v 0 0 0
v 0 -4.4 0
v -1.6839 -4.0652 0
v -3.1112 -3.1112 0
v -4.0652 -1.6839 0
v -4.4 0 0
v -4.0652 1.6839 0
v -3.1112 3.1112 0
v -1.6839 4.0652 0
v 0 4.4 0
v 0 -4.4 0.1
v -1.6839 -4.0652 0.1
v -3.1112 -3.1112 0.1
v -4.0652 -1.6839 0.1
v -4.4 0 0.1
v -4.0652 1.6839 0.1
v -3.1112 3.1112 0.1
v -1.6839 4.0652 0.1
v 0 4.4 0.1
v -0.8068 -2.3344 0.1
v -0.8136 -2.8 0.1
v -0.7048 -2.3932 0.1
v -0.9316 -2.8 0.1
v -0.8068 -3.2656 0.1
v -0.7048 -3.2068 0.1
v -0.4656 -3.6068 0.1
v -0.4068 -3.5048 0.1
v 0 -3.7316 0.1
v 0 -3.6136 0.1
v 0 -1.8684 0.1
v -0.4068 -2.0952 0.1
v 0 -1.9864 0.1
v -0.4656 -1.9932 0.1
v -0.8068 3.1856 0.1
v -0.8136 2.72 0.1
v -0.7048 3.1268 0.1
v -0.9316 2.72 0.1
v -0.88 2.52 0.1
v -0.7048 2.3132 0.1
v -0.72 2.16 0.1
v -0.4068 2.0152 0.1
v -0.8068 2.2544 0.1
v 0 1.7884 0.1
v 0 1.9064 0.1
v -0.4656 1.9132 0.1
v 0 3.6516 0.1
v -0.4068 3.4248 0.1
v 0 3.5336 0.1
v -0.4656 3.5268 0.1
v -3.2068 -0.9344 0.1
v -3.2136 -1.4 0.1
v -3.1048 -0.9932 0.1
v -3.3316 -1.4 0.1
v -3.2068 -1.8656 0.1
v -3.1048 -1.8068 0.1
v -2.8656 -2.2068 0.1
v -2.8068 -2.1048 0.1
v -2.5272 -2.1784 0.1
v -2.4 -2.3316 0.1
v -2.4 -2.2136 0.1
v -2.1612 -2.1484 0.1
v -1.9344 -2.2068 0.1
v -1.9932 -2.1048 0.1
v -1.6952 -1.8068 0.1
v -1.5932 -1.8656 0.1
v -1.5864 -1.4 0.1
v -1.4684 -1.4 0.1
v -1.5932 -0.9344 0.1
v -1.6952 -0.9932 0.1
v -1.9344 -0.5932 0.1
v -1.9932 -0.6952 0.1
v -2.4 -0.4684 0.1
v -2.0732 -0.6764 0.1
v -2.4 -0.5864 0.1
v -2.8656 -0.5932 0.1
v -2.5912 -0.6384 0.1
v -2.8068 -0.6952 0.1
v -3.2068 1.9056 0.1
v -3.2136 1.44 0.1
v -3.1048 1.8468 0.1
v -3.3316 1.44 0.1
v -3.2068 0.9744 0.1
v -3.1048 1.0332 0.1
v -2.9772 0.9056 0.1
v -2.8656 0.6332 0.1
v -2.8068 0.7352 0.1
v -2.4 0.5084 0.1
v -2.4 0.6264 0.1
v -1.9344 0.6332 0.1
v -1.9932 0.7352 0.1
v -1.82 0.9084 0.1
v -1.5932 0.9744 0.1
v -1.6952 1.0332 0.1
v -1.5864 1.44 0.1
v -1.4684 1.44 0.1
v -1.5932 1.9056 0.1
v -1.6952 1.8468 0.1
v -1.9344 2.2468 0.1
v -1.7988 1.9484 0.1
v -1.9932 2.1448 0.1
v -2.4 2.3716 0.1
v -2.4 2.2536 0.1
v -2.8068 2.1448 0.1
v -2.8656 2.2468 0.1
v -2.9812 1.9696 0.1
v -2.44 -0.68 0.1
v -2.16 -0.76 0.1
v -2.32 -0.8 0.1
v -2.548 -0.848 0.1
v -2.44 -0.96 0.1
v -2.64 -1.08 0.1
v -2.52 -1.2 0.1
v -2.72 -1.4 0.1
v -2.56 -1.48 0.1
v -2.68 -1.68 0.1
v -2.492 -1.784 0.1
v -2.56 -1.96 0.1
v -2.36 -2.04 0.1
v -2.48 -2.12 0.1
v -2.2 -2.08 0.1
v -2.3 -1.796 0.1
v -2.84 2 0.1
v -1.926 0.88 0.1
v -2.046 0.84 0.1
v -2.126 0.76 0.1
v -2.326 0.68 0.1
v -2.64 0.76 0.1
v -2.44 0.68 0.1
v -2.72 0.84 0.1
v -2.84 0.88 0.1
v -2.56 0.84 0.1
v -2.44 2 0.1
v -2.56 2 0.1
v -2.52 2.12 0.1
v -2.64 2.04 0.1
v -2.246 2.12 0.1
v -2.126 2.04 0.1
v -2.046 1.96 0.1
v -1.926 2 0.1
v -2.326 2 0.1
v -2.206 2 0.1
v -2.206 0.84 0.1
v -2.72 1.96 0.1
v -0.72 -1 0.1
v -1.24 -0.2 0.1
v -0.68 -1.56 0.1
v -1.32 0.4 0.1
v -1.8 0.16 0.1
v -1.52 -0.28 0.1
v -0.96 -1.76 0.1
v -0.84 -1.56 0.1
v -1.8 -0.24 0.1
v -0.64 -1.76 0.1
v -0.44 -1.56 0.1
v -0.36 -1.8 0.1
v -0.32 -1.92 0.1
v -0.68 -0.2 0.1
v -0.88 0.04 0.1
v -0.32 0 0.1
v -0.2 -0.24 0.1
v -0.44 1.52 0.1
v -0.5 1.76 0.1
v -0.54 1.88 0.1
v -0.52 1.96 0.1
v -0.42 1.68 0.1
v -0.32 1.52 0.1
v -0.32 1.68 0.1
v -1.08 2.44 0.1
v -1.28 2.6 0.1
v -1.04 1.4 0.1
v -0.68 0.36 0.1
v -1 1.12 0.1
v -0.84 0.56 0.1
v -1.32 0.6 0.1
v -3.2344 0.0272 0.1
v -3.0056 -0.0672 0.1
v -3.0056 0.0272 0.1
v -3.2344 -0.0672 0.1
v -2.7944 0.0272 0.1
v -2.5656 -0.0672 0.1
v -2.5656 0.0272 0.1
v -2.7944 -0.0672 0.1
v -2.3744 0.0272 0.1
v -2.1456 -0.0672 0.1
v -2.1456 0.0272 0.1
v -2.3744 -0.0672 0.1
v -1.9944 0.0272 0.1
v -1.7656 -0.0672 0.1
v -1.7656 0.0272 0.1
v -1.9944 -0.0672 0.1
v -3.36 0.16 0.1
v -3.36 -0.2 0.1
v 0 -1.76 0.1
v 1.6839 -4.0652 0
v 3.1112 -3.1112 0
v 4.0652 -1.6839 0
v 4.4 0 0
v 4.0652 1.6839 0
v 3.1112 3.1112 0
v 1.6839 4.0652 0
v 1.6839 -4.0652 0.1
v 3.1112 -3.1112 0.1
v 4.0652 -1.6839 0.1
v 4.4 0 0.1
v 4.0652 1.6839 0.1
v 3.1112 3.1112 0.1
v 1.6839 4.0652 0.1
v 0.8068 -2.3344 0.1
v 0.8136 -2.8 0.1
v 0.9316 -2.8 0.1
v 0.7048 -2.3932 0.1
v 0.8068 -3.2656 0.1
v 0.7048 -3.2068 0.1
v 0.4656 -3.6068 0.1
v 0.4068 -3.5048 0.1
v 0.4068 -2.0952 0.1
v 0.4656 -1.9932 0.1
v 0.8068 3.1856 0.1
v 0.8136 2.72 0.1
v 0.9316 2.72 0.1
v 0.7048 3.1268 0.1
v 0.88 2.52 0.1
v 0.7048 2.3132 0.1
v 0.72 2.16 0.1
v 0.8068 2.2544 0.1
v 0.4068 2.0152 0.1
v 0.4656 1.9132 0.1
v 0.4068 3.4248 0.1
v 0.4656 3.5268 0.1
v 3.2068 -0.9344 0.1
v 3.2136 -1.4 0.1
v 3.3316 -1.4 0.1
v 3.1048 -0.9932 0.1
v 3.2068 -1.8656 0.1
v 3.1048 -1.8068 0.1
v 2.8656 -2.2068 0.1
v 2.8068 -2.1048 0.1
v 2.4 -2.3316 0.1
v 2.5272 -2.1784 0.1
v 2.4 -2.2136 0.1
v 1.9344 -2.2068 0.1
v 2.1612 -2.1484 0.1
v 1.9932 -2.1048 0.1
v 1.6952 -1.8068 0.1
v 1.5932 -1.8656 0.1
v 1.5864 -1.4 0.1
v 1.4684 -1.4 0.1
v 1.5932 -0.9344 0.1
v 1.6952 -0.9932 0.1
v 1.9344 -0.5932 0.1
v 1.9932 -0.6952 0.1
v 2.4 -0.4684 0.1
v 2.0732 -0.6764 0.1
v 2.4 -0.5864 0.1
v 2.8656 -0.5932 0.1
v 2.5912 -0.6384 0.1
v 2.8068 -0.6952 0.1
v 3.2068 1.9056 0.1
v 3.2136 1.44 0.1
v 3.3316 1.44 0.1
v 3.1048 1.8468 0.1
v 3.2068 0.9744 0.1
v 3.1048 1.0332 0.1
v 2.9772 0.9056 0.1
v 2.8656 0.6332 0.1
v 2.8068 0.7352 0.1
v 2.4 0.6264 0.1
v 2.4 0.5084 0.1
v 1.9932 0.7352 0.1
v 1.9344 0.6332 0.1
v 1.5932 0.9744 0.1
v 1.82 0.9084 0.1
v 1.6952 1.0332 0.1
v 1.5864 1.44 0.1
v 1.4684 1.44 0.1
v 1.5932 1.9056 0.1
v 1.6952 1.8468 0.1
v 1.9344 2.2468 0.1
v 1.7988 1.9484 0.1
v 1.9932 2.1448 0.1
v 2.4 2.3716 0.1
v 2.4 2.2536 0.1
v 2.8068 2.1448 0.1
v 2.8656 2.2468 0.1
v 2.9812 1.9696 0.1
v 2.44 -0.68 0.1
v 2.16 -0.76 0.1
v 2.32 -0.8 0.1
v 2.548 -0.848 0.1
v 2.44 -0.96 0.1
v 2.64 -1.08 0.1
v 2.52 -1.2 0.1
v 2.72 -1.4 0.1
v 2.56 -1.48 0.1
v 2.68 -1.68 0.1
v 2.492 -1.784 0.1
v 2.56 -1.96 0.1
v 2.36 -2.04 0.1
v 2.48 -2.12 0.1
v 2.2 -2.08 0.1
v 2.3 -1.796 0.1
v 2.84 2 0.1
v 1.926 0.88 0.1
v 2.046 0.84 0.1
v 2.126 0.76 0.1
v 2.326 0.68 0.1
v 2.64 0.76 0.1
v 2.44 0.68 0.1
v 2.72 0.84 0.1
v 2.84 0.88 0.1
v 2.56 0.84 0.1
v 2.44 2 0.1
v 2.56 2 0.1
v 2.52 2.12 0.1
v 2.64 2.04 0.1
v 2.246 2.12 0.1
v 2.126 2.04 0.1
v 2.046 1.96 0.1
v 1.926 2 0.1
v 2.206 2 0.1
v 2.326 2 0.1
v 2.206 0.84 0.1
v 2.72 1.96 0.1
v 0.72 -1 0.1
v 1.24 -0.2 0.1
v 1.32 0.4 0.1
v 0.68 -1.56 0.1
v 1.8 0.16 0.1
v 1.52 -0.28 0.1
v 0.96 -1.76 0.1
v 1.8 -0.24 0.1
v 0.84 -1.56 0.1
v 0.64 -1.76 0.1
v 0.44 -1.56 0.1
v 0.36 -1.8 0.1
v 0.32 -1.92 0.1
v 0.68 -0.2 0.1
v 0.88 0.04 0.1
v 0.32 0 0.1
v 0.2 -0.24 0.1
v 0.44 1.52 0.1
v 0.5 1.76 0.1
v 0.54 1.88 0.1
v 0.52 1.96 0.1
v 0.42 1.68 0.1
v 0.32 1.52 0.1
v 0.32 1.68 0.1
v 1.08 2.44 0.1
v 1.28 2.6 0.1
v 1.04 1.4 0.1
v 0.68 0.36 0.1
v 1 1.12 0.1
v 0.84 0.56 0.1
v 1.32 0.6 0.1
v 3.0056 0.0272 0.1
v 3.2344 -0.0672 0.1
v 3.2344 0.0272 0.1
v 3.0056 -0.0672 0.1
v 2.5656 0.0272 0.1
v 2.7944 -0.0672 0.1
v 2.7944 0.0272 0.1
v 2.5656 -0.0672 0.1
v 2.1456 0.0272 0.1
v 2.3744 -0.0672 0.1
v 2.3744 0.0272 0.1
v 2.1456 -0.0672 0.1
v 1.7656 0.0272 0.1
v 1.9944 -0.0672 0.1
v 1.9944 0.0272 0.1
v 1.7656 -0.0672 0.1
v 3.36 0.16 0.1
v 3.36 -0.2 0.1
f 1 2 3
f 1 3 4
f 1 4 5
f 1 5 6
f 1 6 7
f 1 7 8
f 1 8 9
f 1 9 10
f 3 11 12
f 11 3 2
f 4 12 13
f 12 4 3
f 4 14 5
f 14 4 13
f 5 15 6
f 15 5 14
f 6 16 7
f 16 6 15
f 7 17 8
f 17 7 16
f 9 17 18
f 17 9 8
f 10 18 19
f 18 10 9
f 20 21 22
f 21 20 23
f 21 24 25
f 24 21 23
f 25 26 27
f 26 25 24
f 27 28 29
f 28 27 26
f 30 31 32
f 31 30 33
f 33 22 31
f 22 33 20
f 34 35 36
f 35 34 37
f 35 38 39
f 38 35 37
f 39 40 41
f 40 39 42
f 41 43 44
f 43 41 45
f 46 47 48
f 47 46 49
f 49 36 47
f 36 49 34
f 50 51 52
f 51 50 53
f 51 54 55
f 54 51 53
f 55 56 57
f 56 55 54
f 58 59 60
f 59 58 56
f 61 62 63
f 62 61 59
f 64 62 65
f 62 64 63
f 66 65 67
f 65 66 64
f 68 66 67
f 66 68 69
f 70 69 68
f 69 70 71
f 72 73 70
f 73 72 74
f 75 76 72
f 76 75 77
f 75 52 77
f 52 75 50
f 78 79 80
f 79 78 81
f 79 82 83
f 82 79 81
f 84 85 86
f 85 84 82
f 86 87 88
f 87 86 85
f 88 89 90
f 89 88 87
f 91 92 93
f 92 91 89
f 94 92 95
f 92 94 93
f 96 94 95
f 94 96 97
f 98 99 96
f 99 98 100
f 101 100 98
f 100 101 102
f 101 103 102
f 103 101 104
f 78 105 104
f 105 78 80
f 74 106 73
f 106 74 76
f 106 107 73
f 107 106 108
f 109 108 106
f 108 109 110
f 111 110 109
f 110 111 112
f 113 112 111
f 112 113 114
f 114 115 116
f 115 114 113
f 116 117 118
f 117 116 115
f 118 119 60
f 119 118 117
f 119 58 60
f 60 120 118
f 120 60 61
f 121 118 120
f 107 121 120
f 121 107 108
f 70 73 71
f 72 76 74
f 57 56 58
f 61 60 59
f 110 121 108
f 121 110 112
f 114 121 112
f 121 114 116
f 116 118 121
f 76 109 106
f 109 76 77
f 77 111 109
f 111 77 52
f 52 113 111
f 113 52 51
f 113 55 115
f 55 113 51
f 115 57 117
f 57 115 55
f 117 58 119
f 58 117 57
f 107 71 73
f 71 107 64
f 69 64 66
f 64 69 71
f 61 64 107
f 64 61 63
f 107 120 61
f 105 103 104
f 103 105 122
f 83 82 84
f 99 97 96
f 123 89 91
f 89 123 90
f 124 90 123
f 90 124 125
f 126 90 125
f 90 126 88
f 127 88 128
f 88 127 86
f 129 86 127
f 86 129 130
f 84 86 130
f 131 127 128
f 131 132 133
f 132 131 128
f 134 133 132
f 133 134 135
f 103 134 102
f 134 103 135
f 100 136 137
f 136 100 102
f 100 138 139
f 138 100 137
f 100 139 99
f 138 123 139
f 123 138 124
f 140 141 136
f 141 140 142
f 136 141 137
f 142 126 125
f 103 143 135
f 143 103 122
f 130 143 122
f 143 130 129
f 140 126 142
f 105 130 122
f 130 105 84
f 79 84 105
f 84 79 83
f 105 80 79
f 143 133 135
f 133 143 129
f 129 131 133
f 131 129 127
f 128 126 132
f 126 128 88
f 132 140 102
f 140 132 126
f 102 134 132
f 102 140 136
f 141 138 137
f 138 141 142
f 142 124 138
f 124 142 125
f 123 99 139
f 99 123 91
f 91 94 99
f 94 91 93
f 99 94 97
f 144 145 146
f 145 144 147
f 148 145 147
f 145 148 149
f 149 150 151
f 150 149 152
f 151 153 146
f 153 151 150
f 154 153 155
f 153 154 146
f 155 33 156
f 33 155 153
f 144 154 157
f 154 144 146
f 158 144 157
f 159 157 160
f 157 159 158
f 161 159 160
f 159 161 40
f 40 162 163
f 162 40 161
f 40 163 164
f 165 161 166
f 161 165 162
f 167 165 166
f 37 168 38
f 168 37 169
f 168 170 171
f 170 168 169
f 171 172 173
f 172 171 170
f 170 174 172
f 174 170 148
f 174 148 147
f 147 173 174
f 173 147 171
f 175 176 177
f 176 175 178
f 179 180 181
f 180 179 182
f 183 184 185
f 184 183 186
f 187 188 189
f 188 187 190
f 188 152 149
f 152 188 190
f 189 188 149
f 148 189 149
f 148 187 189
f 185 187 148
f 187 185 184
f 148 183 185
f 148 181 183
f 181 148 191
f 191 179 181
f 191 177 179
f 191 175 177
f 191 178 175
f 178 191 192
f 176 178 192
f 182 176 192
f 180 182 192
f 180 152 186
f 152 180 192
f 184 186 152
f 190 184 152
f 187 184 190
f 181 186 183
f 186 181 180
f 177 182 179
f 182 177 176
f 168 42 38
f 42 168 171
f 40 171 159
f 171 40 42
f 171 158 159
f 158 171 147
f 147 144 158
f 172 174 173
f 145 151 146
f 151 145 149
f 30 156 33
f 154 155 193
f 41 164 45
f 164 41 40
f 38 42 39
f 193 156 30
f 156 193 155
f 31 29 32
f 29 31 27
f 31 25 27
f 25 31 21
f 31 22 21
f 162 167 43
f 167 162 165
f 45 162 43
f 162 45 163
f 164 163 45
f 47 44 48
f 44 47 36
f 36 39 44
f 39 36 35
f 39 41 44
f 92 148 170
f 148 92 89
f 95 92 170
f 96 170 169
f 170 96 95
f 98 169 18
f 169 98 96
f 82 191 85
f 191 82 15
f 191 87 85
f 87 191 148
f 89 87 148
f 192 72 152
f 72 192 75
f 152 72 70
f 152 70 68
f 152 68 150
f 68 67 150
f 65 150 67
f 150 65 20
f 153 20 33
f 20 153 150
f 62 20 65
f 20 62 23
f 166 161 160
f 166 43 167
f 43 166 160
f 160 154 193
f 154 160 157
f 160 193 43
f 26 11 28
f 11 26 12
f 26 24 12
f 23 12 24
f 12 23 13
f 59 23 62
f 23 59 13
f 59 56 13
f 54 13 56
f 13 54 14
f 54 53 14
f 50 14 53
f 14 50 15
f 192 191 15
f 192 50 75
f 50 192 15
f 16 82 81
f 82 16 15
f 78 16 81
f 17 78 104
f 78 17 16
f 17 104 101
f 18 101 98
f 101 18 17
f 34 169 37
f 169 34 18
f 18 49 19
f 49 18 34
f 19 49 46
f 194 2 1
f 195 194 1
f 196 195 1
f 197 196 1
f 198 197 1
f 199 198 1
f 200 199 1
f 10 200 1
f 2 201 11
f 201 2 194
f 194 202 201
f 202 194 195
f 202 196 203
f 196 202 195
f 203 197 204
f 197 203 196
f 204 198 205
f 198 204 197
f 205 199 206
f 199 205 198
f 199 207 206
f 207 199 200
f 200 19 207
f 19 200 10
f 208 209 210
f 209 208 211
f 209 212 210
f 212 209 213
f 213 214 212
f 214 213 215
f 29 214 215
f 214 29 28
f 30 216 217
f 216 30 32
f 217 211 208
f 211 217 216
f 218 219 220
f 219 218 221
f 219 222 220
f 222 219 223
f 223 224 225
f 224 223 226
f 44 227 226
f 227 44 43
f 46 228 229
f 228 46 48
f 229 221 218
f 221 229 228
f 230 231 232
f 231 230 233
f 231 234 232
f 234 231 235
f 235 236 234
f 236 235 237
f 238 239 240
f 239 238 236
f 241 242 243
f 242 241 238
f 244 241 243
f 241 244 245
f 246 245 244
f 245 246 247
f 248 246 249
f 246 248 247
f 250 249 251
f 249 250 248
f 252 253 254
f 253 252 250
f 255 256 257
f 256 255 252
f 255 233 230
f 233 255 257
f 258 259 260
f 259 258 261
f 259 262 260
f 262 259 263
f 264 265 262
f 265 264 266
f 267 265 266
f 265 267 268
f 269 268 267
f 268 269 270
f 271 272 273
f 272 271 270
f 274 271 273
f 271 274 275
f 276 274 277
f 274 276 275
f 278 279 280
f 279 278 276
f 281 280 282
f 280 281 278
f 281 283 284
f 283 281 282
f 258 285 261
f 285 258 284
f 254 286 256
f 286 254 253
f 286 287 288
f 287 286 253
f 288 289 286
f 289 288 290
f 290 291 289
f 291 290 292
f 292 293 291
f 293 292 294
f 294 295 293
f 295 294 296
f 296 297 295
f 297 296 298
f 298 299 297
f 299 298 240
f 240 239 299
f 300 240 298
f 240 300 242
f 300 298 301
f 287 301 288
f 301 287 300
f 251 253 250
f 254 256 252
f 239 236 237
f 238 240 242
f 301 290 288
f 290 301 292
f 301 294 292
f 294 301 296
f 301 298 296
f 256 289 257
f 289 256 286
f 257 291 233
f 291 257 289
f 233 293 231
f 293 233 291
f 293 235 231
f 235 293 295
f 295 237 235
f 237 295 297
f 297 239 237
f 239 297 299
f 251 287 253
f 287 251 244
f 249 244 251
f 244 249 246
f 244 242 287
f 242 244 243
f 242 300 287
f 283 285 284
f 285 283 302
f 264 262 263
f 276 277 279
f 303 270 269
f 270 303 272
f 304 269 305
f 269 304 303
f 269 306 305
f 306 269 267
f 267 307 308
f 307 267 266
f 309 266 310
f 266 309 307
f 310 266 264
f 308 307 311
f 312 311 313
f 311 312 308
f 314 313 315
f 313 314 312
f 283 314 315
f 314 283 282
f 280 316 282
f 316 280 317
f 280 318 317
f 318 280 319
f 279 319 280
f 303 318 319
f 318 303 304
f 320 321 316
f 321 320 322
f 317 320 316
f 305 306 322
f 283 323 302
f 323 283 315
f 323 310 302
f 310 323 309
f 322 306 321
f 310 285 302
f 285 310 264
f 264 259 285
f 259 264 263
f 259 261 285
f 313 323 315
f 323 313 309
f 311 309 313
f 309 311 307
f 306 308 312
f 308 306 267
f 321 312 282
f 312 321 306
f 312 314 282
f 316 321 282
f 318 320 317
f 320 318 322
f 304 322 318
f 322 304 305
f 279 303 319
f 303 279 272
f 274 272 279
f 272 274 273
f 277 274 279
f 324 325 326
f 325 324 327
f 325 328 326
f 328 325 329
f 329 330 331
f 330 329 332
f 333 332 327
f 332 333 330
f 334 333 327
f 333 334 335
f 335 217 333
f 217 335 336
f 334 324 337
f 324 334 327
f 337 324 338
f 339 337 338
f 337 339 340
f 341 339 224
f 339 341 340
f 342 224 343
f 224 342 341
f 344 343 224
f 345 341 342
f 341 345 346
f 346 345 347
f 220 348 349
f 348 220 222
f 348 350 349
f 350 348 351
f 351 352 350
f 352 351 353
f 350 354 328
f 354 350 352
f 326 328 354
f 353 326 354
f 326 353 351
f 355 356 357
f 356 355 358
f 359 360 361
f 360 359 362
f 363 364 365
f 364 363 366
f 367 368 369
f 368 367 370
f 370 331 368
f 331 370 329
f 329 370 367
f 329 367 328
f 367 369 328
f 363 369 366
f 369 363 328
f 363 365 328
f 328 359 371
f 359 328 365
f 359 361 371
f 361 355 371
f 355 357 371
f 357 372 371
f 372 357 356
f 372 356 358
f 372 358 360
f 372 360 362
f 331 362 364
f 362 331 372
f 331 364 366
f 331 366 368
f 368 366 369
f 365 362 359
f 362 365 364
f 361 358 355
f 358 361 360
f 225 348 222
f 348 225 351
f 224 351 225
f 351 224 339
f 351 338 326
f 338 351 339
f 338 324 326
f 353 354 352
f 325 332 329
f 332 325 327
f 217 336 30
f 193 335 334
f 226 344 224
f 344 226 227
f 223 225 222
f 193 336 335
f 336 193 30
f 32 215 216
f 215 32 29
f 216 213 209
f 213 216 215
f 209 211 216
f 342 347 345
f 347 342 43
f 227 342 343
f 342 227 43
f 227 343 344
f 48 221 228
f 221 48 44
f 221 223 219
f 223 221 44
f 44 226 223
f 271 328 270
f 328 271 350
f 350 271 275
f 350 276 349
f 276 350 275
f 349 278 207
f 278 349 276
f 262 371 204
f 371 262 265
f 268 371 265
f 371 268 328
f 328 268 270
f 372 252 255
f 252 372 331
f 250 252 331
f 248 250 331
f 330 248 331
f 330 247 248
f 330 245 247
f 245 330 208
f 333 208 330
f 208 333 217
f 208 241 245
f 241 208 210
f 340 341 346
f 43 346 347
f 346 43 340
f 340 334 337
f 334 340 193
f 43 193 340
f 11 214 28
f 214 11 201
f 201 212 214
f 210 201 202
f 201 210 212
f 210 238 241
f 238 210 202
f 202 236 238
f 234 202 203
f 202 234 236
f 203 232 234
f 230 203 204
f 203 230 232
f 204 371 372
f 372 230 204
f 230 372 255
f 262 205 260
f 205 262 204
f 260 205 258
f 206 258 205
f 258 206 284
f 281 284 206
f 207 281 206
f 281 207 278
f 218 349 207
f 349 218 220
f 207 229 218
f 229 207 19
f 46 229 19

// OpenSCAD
// file: ../p/empty.scad
use <../lib.scad>
function ldraw_lib__empty() = [
// 0 Empty
// 0 Name: empty.dat
// 0 Author: Steffen [Steffen]
// 0 !LDRAW_ORG Primitive UPDATE 2015-01
// 0 !LICENSE Licensed under CC BY 2.0 and CC BY 4.0 : see CAreadme.txt
// 
// 0 BFC CERTIFY CCW
  [0,"BFC","CERTIFY"],
  [0,"BFC","CCW"],
// 
// 0 !HISTORY 2015-10-11 [PTadmin] Official Update 2015-01
// 
// 
// 0 // Tool MLCad cannot handle really empty files. This file is used as a workaround.
// 0 // It exceptionally contains forbidden non-LDRAW standard syntax to satisfy MLCad until it is fixed OR a different editor has become the de-facto LDRAW standard.
// 0 // The line being used here is an "impossible" conditional line which never should be visible,
// 0 // additionally hidden by a syntax explicitly hiding it from displaying.
// 
// 0 MLCAD HIDE 5 24 0 0 0 0.0001 0 0 0.0001 -0.0001 0 0 0 0
];
module ldraw_lib__empty(step=0, col=false, unit=2/5, alt=false, line=0.2, solid=!$preview)
    makepoly(ldraw_lib__empty(), step=step, col=col, unit=unit, alt=alt, line=line, solid=solid);
ldraw_lib__empty(line=0.2);
// file: ../p/2-4disc.scad
use <../lib.scad>
function ldraw_lib__2_4disc() = [
// 0 Disc 0.5
// 0 Name: 2-4disc.dat
// 0 Author: James Jessiman
// 0 !LDRAW_ORG Primitive UPDATE 2002-02
// 0 !LICENSE Licensed under CC BY 2.0 and CC BY 4.0 : see CAreadme.txt
// 
// 0 BFC CERTIFY CCW
  [0,"BFC","CERTIFY"],
  [0,"BFC","CCW"],
// 
// 0 !HISTORY 1998-12-15 [PTadmin] Official Update 1998-10
// 0 !HISTORY 2002-03-23 [sbliss] Added BFC statement
// 0 !HISTORY 2002-04-25 [PTadmin] Official Update 2002-02
// 0 !HISTORY 2007-06-24 [PTadmin] Header formatted for Contributor Agreement
// 0 !HISTORY 2008-07-01 [PTadmin] Official Update 2008-01
// 
// 
// 3 16 0 0 0 1 0 0 0.9239 0 0.3827
  [3,16,0,0,0,1,0,0,0.9239,0,0.3827],
// 3 16 0 0 0 0.9239 0 0.3827 0.7071 0 0.7071
  [3,16,0,0,0,0.9239,0,0.3827,0.7071,0,0.7071],
// 3 16 0 0 0 0.7071 0 0.7071 0.3827 0 0.9239
  [3,16,0,0,0,0.7071,0,0.7071,0.3827,0,0.9239],
// 3 16 0 0 0 0.3827 0 0.9239 0 0 1
  [3,16,0,0,0,0.3827,0,0.9239,0,0,1],
// 3 16 0 0 0 0 0 1 -0.3827 0 0.9239
  [3,16,0,0,0,0,0,1,-0.3827,0,0.9239],
// 3 16 0 0 0 -0.3827 0 0.9239 -0.7071 0 0.7071
  [3,16,0,0,0,-0.3827,0,0.9239,-0.7071,0,0.7071],
// 3 16 0 0 0 -0.7071 0 0.7071 -0.9239 0 0.3827
  [3,16,0,0,0,-0.7071,0,0.7071,-0.9239,0,0.3827],
// 3 16 0 0 0 -0.9239 0 0.3827 -1 0 -0
  [3,16,0,0,0,-0.9239,0,0.3827,-1,0,-0],
// 0
];
module ldraw_lib__2_4disc(step=0, col=false, unit=2/5, alt=false, line=0.2, solid=!$preview)
    makepoly(ldraw_lib__2_4disc(), step=step, col=col, unit=unit, alt=alt, line=line, solid=solid);
ldraw_lib__2_4disc(line=0.2);
// file: ../p/2-4cyli.scad
use <../lib.scad>
function ldraw_lib__2_4cyli() = [
// 0 Cylinder 0.5
// 0 Name: 2-4cyli.dat
// 0 Author: James Jessiman
// 0 !LDRAW_ORG Primitive UPDATE 2005-01
// 0 !LICENSE Licensed under CC BY 2.0 and CC BY 4.0 : see CAreadme.txt
// 
// 0 BFC CERTIFY CCW
  [0,"BFC","CERTIFY"],
  [0,"BFC","CCW"],
// 
// 0 !HISTORY 2002-03-23 [sbliss] Added BFC statement; compacted code
// 0 !HISTORY 2002-04-25 [PTadmin] Official Update 2002-02
// 0 !HISTORY 2004-12-11 [nielsk] Recreated using Primitive Generator, Edge lines fixed, BFC changed to CCW
// 0 !HISTORY 2005-12-28 [PTadmin] Official Update 2005-01
// 0 !HISTORY 2007-06-24 [PTadmin] Header formatted for Contributor Agreement
// 0 !HISTORY 2008-07-01 [PTadmin] Official Update 2008-01
// 
// 
// 4 16 .9239 1 .3827 .9239 0 .3827 1 0 0 1 1 0
  [4,16,.9239,1,.3827,.9239,0,.3827,1,0,0,1,1,0],
// 4 16 .7071 1 .7071 .7071 0 .7071 .9239 0 .3827 .9239 1 .3827
  [4,16,.7071,1,.7071,.7071,0,.7071,.9239,0,.3827,.9239,1,.3827],
// 4 16 .3827 1 .9239 .3827 0 .9239 .7071 0 .7071 .7071 1 .7071
  [4,16,.3827,1,.9239,.3827,0,.9239,.7071,0,.7071,.7071,1,.7071],
// 4 16 0 1 1 0 0 1 .3827 0 .9239 .3827 1 .9239
  [4,16,0,1,1,0,0,1,.3827,0,.9239,.3827,1,.9239],
// 4 16 -.3827 1 .9239 -.3827 0 .9239 0 0 1 0 1 1
  [4,16,-.3827,1,.9239,-.3827,0,.9239,0,0,1,0,1,1],
// 4 16 -.7071 1 .7071 -.7071 0 .7071 -.3827 0 .9239 -.3827 1 .9239
  [4,16,-.7071,1,.7071,-.7071,0,.7071,-.3827,0,.9239,-.3827,1,.9239],
// 4 16 -.9239 1 .3827 -.9239 0 .3827 -.7071 0 .7071 -.7071 1 .7071
  [4,16,-.9239,1,.3827,-.9239,0,.3827,-.7071,0,.7071,-.7071,1,.7071],
// 4 16 -1 1 0 -1 0 0 -.9239 0 .3827 -.9239 1 .3827
  [4,16,-1,1,0,-1,0,0,-.9239,0,.3827,-.9239,1,.3827],
// 5 24 1 1 0 1 0 0 1 1 -.4142 .9239 1 .3827
  [5,24,1,1,0,1,0,0,1,1,-.4142,.9239,1,.3827],
// 5 24 .9239 1 .3827 .9239 0 .3827 1 1 0 .7071 1 .7071
  [5,24,.9239,1,.3827,.9239,0,.3827,1,1,0,.7071,1,.7071],
// 5 24 .7071 1 .7071 .7071 0 .7071 .9239 1 .3827 .3827 1 .9239
  [5,24,.7071,1,.7071,.7071,0,.7071,.9239,1,.3827,.3827,1,.9239],
// 5 24 .3827 1 .9239 .3827 0 .9239 .7071 1 .7071 0 1 1
  [5,24,.3827,1,.9239,.3827,0,.9239,.7071,1,.7071,0,1,1],
// 5 24 0 1 1 0 0 1 .3827 1 .9239 -.3827 1 .9239
  [5,24,0,1,1,0,0,1,.3827,1,.9239,-.3827,1,.9239],
// 5 24 -.3827 1 .9239 -.3827 0 .9239 0 1 1 -.7071 1 .7071
  [5,24,-.3827,1,.9239,-.3827,0,.9239,0,1,1,-.7071,1,.7071],
// 5 24 -.7071 1 .7071 -.7071 0 .7071 -.3827 1 .9239 -.9239 1 .3827
  [5,24,-.7071,1,.7071,-.7071,0,.7071,-.3827,1,.9239,-.9239,1,.3827],
// 5 24 -.9239 1 .3827 -.9239 0 .3827 -.7071 1 .7071 -1 1 0
  [5,24,-.9239,1,.3827,-.9239,0,.3827,-.7071,1,.7071,-1,1,0],
// 5 24 -1 1 0 -1 0 0 -.9239 1 .3827 -1 1 -.4142
  [5,24,-1,1,0,-1,0,0,-.9239,1,.3827,-1,1,-.4142],
// 0
];
module ldraw_lib__2_4cyli(step=0, col=false, unit=2/5, alt=false, line=0.2, solid=!$preview)
    makepoly(ldraw_lib__2_4cyli(), step=step, col=col, unit=unit, alt=alt, line=line, solid=solid);
ldraw_lib__2_4cyli(line=0.2);
// file: ../p/1-16chrd.scad
use <../lib.scad>
use <empty.scad>
function ldraw_lib__1_16chrd() = [
// 0 Chord 0.0625
// 0 Name: 1-16chrd.dat
// 0 Author: Philippe Hurbain [Philo]
// 0 !LDRAW_ORG Primitive UPDATE 2015-01
// 0 !LICENSE Licensed under CC BY 2.0 and CC BY 4.0 : see CAreadme.txt
// 
// 0 BFC CERTIFY CCW
  [0,"BFC","CERTIFY"],
  [0,"BFC","CCW"],
// 
// 0 !HISTORY 2015-10-11 [PTadmin] Official Update 2015-01
// 
// 
// 0 // This file is intentionally empty because at the current \P resolution,
// 0 // an 1-16chrd is actually empty. However, this file still is present
// 0 // to allow tools to do primitives substition and fill in a real chrd here,
// 0 // or, if desired, to substitute this with the hi-res 48\1-16chrd.
// 
// 0 // This file is based on an idea by Darats at http://forums.ldraw.org/read.php?19,14500,14500#msg-14500
// 
// 1 16 0 0 0 1 0 0 0 1 0 0 0 1 empty.dat
  [1,16,0,0,0,1,0,0,0,1,0,0,0,1, ldraw_lib__empty()],
];
module ldraw_lib__1_16chrd(step=0, col=false, unit=2/5, alt=false, line=0.2, solid=!$preview)
    makepoly(ldraw_lib__1_16chrd(), step=step, col=col, unit=unit, alt=alt, line=line, solid=solid);
ldraw_lib__1_16chrd(line=0.2);
// file: ../p/4-4ering.scad
use <../lib.scad>
use <1-16chrd.scad>
function ldraw_lib__4_4ering() = [
// 0 Adapter Ring Triangles to Normal 1.0
// 0 Name: 4-4ering.dat
// 0 Author: Philippe Hurbain [Philo]
// 0 !LDRAW_ORG Primitive UPDATE 2015-01
// 0 !LICENSE Licensed under CC BY 2.0 and CC BY 4.0 : see CAreadme.txt
// 
// 0 BFC CERTIFY CCW
  [0,"BFC","CERTIFY"],
  [0,"BFC","CCW"],
// 
// 0 !HISTORY 2015-10-11 [PTadmin] Official Update 2015-01
// 
// 
// 0 // This file uses 1-16chrd (actually empty). It allows
// 0 // tools to do primitives substition and fill in a ring of chrd here,
// 0 // or, if desired, to substitute this with the hi-res 48\1-16chrd.
// 0 // This file is based on an idea by Darats at http://forums.ldraw.org/read.php?19,14500,14500#msg-14500
// 
// 1 16 0 0 0 1 0 0 0 1 0 0 0 1 1-16chrd.dat
  [1,16,0,0,0,1,0,0,0,1,0,0,0,1, ldraw_lib__1_16chrd()],
// 1 16 0 0 0 0.92388 0 0.38268 0 1 0 -0.38268 0 0.92388 1-16chrd.dat
  [1,16,0,0,0,0.92388,0,0.38268,0,1,0,-0.38268,0,0.92388, ldraw_lib__1_16chrd()],
// 1 16 0 0 0 0.70711 0 0.70711 0 1 0 -0.70711 0 0.70711 1-16chrd.dat
  [1,16,0,0,0,0.70711,0,0.70711,0,1,0,-0.70711,0,0.70711, ldraw_lib__1_16chrd()],
// 1 16 0 0 0 0.38268 0 0.92388 0 1 0 -0.92388 0 0.38268 1-16chrd.dat
  [1,16,0,0,0,0.38268,0,0.92388,0,1,0,-0.92388,0,0.38268, ldraw_lib__1_16chrd()],
// 1 16 0 0 0 0 0 1 0 1 0 -1 0 0 1-16chrd.dat
  [1,16,0,0,0,0,0,1,0,1,0,-1,0,0, ldraw_lib__1_16chrd()],
// 1 16 0 0 0 -0.38268 0 0.92388 0 1 0 -0.92388 0 -0.38268 1-16chrd.dat
  [1,16,0,0,0,-0.38268,0,0.92388,0,1,0,-0.92388,0,-0.38268, ldraw_lib__1_16chrd()],
// 1 16 0 0 0 -0.70711 0 0.70711 0 1 0 -0.70711 0 -0.70711 1-16chrd.dat
  [1,16,0,0,0,-0.70711,0,0.70711,0,1,0,-0.70711,0,-0.70711, ldraw_lib__1_16chrd()],
// 1 16 0 0 0 -0.92388 0 0.38268 0 1 0 -0.38268 0 -0.92388 1-16chrd.dat
  [1,16,0,0,0,-0.92388,0,0.38268,0,1,0,-0.38268,0,-0.92388, ldraw_lib__1_16chrd()],
// 1 16 0 0 0 0 0 -1 0 1 0 1 0 0 1-16chrd.dat
  [1,16,0,0,0,0,0,-1,0,1,0,1,0,0, ldraw_lib__1_16chrd()],
// 1 16 0 0 0 0.38268 0 -0.92388 0 1 0 0.92388 0 0.38268 1-16chrd.dat
  [1,16,0,0,0,0.38268,0,-0.92388,0,1,0,0.92388,0,0.38268, ldraw_lib__1_16chrd()],
// 1 16 0 0 0 0.70711 0 -0.70711 0 1 0 0.70711 0 0.70711 1-16chrd.dat
  [1,16,0,0,0,0.70711,0,-0.70711,0,1,0,0.70711,0,0.70711, ldraw_lib__1_16chrd()],
// 1 16 0 0 0 0.92388 0 -0.38268 0 1 0 0.38268 0 0.92388 1-16chrd.dat
  [1,16,0,0,0,0.92388,0,-0.38268,0,1,0,0.38268,0,0.92388, ldraw_lib__1_16chrd()],
// 1 16 0 0 0 -1 0 0 0 1 0 0 0 -1 1-16chrd.dat
  [1,16,0,0,0,-1,0,0,0,1,0,0,0,-1, ldraw_lib__1_16chrd()],
// 1 16 0 0 0 -0.92388 0 -0.38268 0 1 0 0.38268 0 -0.92388 1-16chrd.dat
  [1,16,0,0,0,-0.92388,0,-0.38268,0,1,0,0.38268,0,-0.92388, ldraw_lib__1_16chrd()],
// 1 16 0 0 0 -0.70711 0 -0.70711 0 1 0 0.70711 0 -0.70711 1-16chrd.dat
  [1,16,0,0,0,-0.70711,0,-0.70711,0,1,0,0.70711,0,-0.70711, ldraw_lib__1_16chrd()],
// 1 16 0 0 0 -0.38268 0 -0.92388 0 1 0 0.92388 0 -0.38268 1-16chrd.dat
  [1,16,0,0,0,-0.38268,0,-0.92388,0,1,0,0.92388,0,-0.38268, ldraw_lib__1_16chrd()],
];
module ldraw_lib__4_4ering(step=0, col=false, unit=2/5, alt=false, line=0.2, solid=!$preview)
    makepoly(ldraw_lib__4_4ering(), step=step, col=col, unit=unit, alt=alt, line=line, solid=solid);
ldraw_lib__4_4ering(line=0.2);
// main file
use <../lib.scad>
use <../p/4-4ering.scad>
use <s/s13as01.scad>
function ldraw_lib__s13a() = [
// 0 Sticker  1.1 x  1.1 Round with Magnetic Silver Copper Machine
// 0 Name: s13a.dat
// 0 Author: Mikkel Bech Jensen [gaia]
// 0 !LDRAW_ORG Part UPDATE 2018-02
// 0 !LICENSE Licensed under CC BY 2.0 and CC BY 4.0 : see CAreadme.txt
// 
// 0 BFC CERTIFY CCW
  [0,"BFC","CERTIFY"],
  [0,"BFC","CCW"],
// 
// 0 !KEYWORDS Insectoids, Space
// 
// 0 !HISTORY 2018-12-08 [PTadmin] Official Update 2018-02
// 
// 
// 1 16 0 0 0 1 0 0 0 1 0 0 0 1 s\s13as01.dat
  [1,16,0,0,0,1,0,0,0,1,0,0,0,1, ldraw_lib__s__s13as01()],
// 1 16 0 0 0 -1 0 0 0 1 0 0 0 1 s\s13as01.dat
  [1,16,0,0,0,-1,0,0,0,1,0,0,0,1, ldraw_lib__s__s13as01()],
// 1 16 0 -.25 0 0 0 -11 0 1 0 -11 0 0 4-4ering.dat
  [1,16,0,-.25,0,0,0,-11,0,1,0,-11,0,0, ldraw_lib__4_4ering()],
];
module ldraw_lib__s13a(step=0, col=false, unit=2/5, alt=false, line=0.2, solid=!$preview)
    makepoly(ldraw_lib__s13a(), step=step, col=col, unit=unit, alt=alt, line=line, solid=solid);
ldraw_lib__s13a(line=0.2);
